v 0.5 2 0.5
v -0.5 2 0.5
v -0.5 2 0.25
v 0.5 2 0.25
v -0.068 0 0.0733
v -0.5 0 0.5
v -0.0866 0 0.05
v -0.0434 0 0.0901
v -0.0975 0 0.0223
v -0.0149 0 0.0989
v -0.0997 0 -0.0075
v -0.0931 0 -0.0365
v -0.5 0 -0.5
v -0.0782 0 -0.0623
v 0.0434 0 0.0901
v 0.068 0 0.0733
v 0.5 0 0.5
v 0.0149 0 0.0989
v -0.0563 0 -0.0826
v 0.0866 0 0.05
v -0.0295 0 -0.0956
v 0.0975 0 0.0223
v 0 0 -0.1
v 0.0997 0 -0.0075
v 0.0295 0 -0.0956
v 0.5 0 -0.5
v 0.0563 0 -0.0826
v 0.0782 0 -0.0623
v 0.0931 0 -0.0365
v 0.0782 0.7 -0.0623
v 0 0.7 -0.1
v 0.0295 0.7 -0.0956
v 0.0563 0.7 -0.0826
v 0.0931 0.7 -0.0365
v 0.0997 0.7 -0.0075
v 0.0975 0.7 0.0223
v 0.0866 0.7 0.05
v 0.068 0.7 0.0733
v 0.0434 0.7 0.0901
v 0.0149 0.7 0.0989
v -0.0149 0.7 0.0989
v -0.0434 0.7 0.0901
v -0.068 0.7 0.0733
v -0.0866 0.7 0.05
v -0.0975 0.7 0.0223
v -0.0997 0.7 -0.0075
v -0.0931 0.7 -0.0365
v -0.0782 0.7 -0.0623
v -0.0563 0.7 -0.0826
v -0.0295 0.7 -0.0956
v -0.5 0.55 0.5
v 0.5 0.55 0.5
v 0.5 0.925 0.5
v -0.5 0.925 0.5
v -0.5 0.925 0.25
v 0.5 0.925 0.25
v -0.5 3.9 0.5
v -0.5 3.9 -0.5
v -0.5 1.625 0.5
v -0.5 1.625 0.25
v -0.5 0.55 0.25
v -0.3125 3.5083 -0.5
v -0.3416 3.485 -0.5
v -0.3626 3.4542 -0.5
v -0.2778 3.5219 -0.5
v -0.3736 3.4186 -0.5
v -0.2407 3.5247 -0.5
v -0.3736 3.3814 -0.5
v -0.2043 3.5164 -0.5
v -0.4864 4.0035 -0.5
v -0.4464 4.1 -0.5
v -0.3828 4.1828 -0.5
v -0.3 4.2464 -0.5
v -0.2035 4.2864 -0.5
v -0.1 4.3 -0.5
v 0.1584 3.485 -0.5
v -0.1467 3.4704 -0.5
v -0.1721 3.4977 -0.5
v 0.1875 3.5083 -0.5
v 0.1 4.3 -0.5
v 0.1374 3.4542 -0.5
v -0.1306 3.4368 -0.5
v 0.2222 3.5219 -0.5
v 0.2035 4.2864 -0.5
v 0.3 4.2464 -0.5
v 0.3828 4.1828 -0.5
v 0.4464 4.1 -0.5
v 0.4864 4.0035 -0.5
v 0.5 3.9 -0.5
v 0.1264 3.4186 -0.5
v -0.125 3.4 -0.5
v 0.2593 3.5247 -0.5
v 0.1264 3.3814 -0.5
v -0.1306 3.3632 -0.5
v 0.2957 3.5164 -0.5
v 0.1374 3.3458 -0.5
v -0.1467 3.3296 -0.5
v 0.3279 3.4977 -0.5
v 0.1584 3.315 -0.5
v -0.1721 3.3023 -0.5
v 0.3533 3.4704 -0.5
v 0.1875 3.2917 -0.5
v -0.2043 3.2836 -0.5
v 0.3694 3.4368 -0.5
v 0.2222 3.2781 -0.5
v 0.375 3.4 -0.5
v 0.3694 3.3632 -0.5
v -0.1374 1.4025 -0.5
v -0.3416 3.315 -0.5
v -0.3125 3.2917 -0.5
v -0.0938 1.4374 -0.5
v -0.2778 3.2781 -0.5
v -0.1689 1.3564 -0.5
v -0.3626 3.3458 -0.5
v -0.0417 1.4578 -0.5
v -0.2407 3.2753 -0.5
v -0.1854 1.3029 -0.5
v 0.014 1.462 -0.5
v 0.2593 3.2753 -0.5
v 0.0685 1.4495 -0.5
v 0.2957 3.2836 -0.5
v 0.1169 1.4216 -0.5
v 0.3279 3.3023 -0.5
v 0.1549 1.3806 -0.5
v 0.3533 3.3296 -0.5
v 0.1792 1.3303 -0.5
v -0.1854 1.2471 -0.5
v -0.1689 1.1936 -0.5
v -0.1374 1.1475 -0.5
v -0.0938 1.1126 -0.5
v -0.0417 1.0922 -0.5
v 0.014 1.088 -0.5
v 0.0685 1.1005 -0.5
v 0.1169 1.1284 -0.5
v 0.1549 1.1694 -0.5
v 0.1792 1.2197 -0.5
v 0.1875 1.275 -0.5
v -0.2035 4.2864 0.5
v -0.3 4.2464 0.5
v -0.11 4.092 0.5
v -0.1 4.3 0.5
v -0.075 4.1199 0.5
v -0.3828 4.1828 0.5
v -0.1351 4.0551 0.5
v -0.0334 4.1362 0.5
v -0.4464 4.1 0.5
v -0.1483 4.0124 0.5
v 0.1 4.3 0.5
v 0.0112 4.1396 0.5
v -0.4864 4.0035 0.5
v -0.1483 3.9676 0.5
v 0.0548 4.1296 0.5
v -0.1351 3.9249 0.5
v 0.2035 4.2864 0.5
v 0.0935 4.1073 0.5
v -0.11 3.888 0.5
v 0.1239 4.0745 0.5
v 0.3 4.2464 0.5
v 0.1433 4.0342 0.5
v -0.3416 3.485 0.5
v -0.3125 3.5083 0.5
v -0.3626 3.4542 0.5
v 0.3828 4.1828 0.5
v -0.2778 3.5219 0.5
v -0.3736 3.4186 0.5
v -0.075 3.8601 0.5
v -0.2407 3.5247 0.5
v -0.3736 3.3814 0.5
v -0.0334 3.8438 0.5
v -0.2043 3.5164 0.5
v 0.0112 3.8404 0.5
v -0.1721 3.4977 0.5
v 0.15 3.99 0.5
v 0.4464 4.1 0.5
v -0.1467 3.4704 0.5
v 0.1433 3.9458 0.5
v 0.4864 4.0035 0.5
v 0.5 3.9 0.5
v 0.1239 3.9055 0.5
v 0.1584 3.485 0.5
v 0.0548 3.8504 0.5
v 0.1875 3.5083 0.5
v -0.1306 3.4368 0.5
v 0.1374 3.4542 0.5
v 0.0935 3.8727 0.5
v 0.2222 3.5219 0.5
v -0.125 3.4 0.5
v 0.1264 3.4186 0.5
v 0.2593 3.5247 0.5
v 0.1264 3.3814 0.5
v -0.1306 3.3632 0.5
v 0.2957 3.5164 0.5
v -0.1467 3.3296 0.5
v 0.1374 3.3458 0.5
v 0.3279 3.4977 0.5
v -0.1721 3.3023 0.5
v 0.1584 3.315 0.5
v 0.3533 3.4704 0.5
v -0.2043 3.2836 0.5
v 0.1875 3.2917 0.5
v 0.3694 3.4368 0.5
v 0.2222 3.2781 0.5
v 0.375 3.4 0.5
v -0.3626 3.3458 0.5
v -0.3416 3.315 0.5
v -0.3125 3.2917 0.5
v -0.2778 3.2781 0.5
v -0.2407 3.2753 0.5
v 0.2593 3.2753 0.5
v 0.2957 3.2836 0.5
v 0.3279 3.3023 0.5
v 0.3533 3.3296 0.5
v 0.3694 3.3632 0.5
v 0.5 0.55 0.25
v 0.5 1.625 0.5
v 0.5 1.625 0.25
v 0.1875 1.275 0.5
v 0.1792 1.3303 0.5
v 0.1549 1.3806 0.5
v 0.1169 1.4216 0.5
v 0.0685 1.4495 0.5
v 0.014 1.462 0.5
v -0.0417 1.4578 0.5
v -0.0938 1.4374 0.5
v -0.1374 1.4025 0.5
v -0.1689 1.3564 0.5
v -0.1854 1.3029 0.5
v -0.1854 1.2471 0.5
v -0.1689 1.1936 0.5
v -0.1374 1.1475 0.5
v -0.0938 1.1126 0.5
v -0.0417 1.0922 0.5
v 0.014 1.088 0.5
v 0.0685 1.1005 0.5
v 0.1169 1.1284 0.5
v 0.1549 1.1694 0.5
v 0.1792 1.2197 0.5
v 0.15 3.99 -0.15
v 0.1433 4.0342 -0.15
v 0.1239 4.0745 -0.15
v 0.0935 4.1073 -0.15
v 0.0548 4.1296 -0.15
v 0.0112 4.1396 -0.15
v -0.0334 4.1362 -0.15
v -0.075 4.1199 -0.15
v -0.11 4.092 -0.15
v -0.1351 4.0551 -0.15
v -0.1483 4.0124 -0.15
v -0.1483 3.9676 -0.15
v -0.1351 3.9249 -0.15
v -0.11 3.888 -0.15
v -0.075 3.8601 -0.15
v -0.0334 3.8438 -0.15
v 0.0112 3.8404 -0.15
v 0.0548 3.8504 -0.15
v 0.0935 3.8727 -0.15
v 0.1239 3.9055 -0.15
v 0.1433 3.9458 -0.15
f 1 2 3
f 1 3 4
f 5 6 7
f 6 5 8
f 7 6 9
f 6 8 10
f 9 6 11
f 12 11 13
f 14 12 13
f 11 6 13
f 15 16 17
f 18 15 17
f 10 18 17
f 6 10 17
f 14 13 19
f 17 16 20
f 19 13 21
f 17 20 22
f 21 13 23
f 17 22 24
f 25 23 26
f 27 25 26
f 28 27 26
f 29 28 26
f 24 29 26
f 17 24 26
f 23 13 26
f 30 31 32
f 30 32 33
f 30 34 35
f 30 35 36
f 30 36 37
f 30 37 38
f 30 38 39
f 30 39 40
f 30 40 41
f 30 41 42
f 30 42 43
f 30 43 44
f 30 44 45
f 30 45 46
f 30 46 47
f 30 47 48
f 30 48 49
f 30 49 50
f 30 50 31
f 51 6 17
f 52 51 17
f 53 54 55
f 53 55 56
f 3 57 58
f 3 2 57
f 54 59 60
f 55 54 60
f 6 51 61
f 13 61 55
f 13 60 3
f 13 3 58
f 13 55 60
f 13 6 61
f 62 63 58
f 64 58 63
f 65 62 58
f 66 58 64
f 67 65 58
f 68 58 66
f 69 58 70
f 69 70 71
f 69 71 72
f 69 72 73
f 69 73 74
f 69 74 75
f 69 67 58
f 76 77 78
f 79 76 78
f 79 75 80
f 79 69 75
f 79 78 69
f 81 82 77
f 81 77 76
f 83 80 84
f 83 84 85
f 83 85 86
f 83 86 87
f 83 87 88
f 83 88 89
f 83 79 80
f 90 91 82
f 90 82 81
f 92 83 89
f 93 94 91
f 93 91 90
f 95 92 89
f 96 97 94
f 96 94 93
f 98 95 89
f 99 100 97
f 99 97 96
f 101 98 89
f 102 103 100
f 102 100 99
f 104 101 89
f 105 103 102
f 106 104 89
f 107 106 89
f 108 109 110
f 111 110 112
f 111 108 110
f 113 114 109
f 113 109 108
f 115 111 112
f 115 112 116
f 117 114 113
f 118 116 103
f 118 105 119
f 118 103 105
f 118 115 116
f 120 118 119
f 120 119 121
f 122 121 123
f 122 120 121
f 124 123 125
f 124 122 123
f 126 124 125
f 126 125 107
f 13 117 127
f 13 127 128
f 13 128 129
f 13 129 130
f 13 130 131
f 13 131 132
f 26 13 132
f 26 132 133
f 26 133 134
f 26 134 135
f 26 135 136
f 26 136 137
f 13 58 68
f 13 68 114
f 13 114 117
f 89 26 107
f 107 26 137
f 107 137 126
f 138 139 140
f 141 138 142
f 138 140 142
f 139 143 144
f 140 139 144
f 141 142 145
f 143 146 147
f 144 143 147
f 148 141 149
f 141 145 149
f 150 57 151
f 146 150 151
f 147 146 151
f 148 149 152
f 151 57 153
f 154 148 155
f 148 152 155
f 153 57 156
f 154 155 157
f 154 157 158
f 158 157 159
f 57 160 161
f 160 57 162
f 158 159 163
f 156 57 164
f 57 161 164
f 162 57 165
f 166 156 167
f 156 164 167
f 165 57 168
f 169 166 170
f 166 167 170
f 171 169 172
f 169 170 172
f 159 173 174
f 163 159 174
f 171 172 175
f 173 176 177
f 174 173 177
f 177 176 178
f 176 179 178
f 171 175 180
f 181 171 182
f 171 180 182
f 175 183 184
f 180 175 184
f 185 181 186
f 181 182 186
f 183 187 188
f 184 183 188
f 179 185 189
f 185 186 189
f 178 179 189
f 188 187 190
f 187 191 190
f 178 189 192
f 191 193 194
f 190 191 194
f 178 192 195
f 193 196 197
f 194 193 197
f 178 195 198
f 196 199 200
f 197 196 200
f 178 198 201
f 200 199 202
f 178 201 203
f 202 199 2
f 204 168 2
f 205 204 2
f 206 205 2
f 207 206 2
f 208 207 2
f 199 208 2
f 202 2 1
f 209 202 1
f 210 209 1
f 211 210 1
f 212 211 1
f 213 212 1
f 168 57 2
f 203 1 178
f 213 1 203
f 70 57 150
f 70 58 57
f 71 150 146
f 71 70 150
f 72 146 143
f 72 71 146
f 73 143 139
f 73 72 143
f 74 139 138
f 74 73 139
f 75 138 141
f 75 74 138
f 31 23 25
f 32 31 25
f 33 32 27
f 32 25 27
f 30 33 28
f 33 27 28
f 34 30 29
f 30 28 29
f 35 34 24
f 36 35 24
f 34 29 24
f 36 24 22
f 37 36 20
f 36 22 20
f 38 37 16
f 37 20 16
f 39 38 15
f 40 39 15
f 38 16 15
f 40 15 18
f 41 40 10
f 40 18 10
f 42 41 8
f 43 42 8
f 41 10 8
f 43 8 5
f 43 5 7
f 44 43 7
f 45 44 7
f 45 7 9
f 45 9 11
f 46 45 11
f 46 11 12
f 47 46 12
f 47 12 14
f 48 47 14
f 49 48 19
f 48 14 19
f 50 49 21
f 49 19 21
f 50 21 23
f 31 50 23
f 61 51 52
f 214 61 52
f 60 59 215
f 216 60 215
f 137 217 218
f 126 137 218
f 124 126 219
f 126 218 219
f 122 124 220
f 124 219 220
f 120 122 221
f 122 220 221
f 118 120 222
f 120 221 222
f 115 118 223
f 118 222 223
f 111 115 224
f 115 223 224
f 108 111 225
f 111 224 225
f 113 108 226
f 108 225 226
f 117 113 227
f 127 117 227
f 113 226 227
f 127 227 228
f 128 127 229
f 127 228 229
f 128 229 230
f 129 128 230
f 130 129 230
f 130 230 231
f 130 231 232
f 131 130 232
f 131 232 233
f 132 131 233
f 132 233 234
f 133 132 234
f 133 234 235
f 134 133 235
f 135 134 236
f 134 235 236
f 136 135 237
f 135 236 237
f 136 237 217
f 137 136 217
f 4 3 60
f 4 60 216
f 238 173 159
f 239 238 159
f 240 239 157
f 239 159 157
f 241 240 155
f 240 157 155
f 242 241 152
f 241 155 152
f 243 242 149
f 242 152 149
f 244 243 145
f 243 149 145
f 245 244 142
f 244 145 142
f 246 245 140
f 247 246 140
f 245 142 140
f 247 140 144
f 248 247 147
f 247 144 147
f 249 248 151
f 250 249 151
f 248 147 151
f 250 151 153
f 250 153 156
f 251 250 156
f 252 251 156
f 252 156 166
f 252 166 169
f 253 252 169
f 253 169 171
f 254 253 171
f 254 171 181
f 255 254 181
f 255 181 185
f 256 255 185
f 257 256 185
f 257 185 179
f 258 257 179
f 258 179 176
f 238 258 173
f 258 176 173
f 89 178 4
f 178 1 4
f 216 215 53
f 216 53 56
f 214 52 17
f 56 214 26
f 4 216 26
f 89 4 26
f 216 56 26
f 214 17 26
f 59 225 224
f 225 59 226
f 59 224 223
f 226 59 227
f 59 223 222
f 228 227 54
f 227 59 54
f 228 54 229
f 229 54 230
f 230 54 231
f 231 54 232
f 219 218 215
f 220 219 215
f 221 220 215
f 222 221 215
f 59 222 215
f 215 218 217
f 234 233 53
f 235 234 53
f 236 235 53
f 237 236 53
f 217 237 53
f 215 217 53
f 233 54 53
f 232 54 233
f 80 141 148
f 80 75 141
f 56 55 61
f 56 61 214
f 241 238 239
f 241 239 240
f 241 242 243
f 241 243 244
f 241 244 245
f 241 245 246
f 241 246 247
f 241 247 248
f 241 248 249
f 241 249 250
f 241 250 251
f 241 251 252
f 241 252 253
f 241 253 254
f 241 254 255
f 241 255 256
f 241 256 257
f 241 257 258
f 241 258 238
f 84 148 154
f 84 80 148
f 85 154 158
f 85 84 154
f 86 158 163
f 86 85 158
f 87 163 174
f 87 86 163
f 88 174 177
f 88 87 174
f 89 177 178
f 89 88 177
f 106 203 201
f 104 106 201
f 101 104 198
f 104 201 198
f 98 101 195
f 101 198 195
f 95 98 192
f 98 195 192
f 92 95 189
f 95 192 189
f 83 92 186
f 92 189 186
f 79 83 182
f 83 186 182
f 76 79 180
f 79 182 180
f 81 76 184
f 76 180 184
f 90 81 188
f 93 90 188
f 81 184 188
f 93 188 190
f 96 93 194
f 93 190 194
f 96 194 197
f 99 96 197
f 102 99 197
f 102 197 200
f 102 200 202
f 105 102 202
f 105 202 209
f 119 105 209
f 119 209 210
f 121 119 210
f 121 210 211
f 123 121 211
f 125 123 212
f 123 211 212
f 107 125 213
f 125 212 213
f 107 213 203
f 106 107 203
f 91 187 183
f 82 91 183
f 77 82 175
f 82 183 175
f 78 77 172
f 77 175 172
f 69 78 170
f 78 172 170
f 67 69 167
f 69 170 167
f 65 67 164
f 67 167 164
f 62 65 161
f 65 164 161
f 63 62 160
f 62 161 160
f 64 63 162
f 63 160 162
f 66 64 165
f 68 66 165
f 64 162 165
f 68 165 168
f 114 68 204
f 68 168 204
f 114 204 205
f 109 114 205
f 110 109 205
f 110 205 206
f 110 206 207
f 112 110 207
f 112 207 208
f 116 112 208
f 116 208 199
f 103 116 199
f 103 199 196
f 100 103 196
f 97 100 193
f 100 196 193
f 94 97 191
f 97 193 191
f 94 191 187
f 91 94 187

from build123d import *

# Parameters (mm, degrees)
SKETCH2_W           = 1
SKETCH2_H           = 1
BOSS_EXTRUDE1_DEPTH = 4.3
SKETCH3_R           = 0.1
CUT_EXTRUDE1_DEPTH  = 0.7
SKETCH4_W           = 1
SKETCH4_H           = 0.375
CUT_EXTRUDE2_DEPTH  = 0.25
SKETCH5_R           = 0.1875
CUT_EXTRUDE3_DEPTH  = 1
SKETCH7_R           = 0.15
CUT_EXTRUDE6_DEPTH  = 0.65
SKETCH8_R           = 0.125
CUT_EXTRUDE7_DEPTH  = 1
FILLET1_R           = 0.4
SKETCH6_W           = 1
SKETCH6_H           = 0.375
CUT_EXTRUDE8_DEPTH  = 0.25


with BuildPart() as part:
    # Sketch2 → Boss-Extrude1 (new body)
    with BuildSketch(Plane(origin=(0, 0, 0), x_dir=(1, 0, 0), z_dir=(0, 1, 0))):
        Rectangle(SKETCH2_W, SKETCH2_H)
    extrude(amount=BOSS_EXTRUDE1_DEPTH)

    # Sketch3 → Cut-Extrude1 (cut)
    with BuildSketch(Plane.XZ):
        with Locations(Location((0, 0, 0), (0, 0, 270))):
            Circle(SKETCH3_R)
    extrude(amount=-CUT_EXTRUDE1_DEPTH, mode=Mode.SUBTRACT)

    # Sketch4 → Cut-Extrude2 (cut)
    with BuildSketch(Plane.XY.offset(0.5)):
        with Locations((0, 1.8125)):
            Rectangle(SKETCH4_W, SKETCH4_H)
    extrude(amount=-CUT_EXTRUDE2_DEPTH, mode=Mode.SUBTRACT)

    # Sketch5 → Cut-Extrude3 (cut)
    with BuildSketch(Plane.XY.offset(0.5)):
        with Locations((0, 1.275)):
            Circle(SKETCH5_R)
    extrude(amount=-CUT_EXTRUDE3_DEPTH, mode=Mode.SUBTRACT)

    # Sketch7 → Cut-Extrude6 (cut)
    with BuildSketch(Plane.XY.offset(0.5)):
        with Locations((0, 3.99)):
            Circle(SKETCH7_R)
    extrude(amount=-CUT_EXTRUDE6_DEPTH, mode=Mode.SUBTRACT)

    # Sketch8 → Cut-Extrude7 (cut)
    with BuildSketch(Plane.XY.offset(0.5)):
        with Locations((-0.25, 3.4)):
            Circle(SKETCH8_R)
        with Locations((0.25, 3.4)):
            Circle(SKETCH8_R)
    extrude(amount=-CUT_EXTRUDE7_DEPTH, mode=Mode.SUBTRACT)

    # Fillet1
    fillet1_edges = [part.edges().sort_by_distance(p)[0] for p in [
        (-0.5, 4.3, 0),
        (0.5, 4.3, 0),
    ]]
    fillet(fillet1_edges, radius=FILLET1_R)

    # Sketch6 → Cut-Extrude8 (cut)
    with BuildSketch(Plane.XY.offset(0.5)):
        with Locations((0, 0.7375)):
            Rectangle(SKETCH6_W, SKETCH6_H)
    extrude(amount=-CUT_EXTRUDE8_DEPTH, mode=Mode.SUBTRACT)


solid = part.part
